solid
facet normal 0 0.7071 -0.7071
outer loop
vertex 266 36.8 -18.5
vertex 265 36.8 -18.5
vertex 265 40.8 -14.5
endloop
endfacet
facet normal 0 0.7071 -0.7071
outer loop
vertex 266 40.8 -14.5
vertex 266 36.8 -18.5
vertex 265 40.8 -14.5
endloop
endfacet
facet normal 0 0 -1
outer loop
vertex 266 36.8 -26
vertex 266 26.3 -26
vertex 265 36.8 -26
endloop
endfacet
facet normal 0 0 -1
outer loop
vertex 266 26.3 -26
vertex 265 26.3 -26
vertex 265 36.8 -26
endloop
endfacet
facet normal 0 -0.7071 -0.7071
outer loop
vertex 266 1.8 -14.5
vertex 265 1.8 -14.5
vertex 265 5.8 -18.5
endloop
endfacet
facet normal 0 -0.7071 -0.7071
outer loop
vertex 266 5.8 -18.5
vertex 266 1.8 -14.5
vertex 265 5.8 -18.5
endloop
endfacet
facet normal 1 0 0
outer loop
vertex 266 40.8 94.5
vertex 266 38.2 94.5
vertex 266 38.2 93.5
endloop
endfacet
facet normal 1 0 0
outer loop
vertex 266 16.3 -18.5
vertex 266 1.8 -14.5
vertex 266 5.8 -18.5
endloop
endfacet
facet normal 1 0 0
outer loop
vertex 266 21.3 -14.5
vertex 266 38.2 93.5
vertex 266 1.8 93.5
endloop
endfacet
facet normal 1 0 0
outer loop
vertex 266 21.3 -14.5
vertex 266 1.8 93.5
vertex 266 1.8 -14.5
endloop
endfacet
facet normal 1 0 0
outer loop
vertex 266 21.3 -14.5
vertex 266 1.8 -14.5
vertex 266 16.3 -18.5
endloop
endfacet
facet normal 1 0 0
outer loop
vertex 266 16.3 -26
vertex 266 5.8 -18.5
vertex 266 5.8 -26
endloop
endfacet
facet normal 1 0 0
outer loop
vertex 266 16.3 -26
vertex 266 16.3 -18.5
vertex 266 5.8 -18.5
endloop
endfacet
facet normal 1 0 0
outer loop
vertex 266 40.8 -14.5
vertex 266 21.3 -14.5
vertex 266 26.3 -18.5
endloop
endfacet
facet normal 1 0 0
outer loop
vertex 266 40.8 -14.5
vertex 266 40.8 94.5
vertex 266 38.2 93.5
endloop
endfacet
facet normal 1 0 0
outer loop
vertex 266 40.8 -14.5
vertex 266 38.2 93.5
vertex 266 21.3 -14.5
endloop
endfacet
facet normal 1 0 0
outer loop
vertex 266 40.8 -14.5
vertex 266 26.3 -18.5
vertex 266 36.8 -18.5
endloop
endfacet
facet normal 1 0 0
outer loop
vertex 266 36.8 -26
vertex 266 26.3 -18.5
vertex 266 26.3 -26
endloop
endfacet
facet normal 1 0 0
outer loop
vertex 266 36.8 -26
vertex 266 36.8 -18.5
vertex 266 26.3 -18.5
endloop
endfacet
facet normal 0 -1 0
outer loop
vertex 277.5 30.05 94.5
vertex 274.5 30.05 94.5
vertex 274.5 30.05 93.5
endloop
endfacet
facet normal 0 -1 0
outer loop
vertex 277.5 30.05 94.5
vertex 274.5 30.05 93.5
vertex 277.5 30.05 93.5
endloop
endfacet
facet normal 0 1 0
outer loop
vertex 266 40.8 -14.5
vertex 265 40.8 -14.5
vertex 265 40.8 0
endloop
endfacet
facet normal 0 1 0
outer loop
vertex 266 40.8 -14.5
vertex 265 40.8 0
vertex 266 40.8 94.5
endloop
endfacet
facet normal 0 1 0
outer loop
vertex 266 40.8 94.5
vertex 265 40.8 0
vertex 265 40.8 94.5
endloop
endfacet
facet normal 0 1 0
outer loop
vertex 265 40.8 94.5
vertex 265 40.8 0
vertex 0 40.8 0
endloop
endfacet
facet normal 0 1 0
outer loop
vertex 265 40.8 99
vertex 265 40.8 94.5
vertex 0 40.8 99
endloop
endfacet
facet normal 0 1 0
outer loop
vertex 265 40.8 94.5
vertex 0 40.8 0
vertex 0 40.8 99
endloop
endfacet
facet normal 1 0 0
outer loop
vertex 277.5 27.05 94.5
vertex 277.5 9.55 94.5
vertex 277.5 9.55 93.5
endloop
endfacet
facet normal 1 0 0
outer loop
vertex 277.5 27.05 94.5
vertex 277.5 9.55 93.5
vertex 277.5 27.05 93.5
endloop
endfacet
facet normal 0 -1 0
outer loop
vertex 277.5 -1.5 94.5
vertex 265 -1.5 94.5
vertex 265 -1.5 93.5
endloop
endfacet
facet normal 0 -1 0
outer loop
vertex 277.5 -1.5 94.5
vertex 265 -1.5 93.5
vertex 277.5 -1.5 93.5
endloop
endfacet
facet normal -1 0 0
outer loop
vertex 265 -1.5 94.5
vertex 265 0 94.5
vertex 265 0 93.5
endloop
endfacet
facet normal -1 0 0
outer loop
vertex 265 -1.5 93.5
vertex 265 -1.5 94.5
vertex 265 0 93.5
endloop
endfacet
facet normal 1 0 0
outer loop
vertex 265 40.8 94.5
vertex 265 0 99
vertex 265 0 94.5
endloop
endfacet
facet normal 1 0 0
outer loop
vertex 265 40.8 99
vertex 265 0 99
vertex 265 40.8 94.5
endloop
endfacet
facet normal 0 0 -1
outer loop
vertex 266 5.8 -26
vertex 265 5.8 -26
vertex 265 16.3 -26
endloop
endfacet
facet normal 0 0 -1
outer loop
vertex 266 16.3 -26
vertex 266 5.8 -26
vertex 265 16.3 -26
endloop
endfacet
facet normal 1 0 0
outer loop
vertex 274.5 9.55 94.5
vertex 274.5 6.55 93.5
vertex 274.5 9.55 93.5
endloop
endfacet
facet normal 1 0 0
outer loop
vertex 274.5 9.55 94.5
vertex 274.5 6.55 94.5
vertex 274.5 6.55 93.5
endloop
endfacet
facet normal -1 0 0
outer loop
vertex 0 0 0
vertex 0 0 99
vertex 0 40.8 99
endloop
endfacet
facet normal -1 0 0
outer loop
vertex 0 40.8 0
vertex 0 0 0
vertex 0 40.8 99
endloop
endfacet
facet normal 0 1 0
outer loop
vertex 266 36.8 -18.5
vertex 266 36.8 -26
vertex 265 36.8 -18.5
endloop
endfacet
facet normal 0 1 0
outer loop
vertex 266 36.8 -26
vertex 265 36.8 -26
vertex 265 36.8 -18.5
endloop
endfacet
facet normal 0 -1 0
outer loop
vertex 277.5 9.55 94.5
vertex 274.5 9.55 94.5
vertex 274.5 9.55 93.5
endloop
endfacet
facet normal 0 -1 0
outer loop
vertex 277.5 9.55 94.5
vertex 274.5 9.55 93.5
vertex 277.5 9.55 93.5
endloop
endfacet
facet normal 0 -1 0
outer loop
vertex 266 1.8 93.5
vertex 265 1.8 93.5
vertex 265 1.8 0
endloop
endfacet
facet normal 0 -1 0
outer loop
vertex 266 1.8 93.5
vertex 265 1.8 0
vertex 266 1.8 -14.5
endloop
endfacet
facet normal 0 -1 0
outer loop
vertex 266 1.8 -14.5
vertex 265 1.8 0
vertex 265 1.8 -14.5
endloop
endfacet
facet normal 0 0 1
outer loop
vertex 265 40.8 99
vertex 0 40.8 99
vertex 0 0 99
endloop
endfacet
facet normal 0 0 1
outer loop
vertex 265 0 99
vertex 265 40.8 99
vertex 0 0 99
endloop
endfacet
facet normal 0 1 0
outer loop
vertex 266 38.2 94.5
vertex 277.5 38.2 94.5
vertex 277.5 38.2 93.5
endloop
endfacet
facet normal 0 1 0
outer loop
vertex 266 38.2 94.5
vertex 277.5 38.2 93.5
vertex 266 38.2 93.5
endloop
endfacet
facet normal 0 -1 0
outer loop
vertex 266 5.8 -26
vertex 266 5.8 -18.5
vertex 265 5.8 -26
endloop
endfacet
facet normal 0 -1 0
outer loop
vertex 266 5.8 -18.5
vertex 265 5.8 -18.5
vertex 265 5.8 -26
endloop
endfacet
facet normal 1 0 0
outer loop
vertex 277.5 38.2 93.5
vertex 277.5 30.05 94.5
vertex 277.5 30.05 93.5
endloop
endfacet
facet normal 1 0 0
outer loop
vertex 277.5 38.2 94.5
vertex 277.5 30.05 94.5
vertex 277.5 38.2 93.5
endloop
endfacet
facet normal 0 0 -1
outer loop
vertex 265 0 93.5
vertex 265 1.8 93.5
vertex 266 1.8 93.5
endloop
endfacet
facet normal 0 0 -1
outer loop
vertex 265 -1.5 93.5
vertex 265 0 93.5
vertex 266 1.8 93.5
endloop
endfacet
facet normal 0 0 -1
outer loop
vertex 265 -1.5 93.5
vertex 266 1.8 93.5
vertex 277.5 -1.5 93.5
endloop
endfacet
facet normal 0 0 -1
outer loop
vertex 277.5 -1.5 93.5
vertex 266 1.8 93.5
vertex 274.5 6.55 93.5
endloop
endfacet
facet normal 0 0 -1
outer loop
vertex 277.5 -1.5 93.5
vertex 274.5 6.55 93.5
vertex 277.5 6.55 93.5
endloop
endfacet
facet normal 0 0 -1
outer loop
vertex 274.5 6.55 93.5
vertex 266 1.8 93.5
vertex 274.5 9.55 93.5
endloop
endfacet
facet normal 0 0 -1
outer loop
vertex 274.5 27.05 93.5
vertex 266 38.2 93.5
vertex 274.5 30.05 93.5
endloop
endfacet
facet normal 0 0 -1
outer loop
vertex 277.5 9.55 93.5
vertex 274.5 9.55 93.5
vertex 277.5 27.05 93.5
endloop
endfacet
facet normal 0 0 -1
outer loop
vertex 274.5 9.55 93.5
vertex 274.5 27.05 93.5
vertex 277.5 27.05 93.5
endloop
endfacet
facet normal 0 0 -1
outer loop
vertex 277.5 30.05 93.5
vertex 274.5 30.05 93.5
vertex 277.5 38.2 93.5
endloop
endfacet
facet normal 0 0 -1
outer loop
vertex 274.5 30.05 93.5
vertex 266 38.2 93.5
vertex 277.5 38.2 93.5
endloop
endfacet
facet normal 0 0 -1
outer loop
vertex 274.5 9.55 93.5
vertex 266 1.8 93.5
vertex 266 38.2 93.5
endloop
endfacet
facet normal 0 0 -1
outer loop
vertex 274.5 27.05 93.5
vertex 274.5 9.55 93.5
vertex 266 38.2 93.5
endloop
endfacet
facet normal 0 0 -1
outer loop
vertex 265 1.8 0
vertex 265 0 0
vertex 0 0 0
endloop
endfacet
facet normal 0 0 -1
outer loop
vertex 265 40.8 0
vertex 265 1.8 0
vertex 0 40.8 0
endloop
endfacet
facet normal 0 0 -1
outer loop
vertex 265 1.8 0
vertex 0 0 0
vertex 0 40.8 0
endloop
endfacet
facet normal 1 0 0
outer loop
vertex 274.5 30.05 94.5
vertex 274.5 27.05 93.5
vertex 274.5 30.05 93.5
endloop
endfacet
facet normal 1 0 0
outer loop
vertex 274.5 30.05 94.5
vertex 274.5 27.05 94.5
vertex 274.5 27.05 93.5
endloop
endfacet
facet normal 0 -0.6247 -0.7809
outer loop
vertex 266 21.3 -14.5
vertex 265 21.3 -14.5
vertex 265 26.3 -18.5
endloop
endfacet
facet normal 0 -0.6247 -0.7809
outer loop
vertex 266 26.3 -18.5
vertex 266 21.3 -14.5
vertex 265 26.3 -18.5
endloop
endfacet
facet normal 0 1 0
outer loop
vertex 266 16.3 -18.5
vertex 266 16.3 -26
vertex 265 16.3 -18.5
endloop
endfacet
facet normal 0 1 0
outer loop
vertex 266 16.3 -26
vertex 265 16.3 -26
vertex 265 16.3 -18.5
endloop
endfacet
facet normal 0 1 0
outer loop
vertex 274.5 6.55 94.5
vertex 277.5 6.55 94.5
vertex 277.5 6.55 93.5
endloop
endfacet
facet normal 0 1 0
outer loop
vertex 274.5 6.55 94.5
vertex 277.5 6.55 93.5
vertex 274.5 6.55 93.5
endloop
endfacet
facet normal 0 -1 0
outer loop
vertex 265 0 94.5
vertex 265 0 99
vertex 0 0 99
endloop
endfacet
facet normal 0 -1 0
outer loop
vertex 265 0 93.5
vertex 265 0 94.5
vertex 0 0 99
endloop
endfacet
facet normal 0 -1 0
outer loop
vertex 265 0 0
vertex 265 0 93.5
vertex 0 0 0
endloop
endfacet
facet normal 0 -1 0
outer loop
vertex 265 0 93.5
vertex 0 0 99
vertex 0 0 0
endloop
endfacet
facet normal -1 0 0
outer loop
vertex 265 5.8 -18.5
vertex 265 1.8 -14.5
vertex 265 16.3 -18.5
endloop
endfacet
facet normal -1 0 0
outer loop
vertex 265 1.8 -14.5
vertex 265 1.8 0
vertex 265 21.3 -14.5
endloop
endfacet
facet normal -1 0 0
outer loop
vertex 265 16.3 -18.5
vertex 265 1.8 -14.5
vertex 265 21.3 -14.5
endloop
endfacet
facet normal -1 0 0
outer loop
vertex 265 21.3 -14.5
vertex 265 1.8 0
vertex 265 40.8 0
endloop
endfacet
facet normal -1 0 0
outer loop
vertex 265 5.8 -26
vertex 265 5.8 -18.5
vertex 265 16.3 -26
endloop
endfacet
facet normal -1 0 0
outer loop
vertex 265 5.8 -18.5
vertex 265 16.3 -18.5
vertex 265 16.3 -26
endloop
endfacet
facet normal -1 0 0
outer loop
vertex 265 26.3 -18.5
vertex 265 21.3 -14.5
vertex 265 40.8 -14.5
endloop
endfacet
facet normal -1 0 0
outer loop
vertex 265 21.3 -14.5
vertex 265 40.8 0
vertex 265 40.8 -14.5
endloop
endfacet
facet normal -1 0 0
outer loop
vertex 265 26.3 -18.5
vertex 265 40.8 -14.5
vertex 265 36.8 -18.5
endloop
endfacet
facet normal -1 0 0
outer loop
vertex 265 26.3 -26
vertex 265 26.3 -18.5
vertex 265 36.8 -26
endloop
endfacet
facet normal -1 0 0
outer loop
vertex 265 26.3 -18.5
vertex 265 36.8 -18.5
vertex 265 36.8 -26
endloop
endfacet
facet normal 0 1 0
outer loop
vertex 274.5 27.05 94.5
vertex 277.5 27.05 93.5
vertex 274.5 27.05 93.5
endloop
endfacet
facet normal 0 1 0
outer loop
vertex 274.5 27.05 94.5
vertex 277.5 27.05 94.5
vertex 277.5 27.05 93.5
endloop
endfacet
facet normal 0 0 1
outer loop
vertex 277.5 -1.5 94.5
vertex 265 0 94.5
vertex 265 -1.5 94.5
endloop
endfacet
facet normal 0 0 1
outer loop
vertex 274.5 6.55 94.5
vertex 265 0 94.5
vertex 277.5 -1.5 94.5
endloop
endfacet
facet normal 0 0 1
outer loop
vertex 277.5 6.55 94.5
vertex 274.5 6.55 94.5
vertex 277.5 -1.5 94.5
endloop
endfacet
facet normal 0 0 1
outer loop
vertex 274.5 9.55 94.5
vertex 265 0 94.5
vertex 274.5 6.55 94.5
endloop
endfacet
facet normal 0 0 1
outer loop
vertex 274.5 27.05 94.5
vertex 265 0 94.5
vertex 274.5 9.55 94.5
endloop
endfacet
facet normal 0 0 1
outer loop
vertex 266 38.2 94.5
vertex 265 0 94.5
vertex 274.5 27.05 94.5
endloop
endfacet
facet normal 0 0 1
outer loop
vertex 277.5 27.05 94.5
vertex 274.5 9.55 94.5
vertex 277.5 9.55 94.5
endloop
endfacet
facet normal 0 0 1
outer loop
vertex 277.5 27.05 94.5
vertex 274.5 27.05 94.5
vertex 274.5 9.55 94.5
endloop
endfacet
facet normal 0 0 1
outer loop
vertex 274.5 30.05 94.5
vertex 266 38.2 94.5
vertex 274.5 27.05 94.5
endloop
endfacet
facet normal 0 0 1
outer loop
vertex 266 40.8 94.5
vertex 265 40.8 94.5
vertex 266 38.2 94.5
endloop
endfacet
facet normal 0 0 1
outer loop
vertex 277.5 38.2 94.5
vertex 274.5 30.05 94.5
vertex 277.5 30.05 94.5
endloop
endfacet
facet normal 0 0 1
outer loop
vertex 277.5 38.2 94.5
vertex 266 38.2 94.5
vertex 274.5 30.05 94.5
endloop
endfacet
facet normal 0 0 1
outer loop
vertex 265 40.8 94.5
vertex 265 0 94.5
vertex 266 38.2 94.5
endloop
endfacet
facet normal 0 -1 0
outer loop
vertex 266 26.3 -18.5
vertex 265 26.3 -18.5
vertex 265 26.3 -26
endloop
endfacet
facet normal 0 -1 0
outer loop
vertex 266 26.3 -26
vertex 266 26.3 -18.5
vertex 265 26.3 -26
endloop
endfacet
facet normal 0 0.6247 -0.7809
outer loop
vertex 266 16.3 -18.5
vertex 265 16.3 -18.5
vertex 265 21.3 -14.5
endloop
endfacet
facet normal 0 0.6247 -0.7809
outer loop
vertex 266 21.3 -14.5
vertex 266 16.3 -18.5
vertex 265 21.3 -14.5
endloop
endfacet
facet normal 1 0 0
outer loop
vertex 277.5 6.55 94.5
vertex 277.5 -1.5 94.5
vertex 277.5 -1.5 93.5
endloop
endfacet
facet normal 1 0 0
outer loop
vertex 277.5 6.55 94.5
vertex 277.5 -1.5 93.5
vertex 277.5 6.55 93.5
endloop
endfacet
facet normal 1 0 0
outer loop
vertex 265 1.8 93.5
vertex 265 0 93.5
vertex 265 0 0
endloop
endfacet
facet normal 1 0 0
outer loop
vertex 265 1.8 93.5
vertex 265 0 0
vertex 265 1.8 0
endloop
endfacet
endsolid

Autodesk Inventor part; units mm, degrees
ref_plane "YZ Plane" through (0, 0, 0) normal (1, 0, 0) x (0, 1, 0)
ref_plane "XZ Plane" through (0, 0, 0) normal (0, 1, 0) x (-1, 0, 0)
ref_plane "XY Plane" through (0, 0, 0) normal (0, 0, 1) x (1, 0, 0)
sketch "Sketch1" plane through (0, 0, 0) normal (1, 0, 0) x (0, 1, 0)
  line L0 (0, 0) -> (40.8, 0)
  line L1 (40.8, 0) -> (40.8, 99)
  line L2 (40.8, 99) -> (0, 99)
  line L3 (0, 99) -> (0, 0)
  dimension "d0" = 40.8
  dimension "d1" = 99
extrude "Extrusion1" add sketch "Sketch1" along normal blind 265
sketch "Sketch2" plane through (265, 0, 0) normal (1, 0, 0) x (0, 0, -1)
  line L0 (0, 40.8) -> (-99, 40.8) projected
  line L1 (-94.5, 40.8) -> (-94.5, -1.5)
  line L2 (-94.5, -1.5) -> (-93.5, -1.5)
  line L3 (-93.5, -1.5) -> (-93.5, 1.8)
  line L4 (-93.5, 1.8) -> (14.5, 1.8)
  line L5 (14.5, 1.8) -> (18.5, 5.8)
  line L6 (18.5, 5.8) -> (26, 5.8)
  line L7 (26, 5.8) -> (26, 16.3)
  line L8 (26, 16.3) -> (18.5, 16.3)
  line L9 (18.5, 16.3) -> (14.5, 21.3)
  line L10 (14.5, 21.3) -> (18.5, 26.3)
  line L11 (18.5, 26.3) -> (26, 26.3)
  line L12 (26, 26.3) -> (26, 36.8)
  line L13 (26, 36.8) -> (18.5, 36.8)
  line L14 (18.5, 36.8) -> (14.5, 40.8)
  line L15 (14.5, 40.8) -> (0, 40.8)
  line L16 (0, 0) -> (0, 40.8) projected
  line L17 (0, 40.8) -> (-94.5, 40.8)
  line L18 (-99, 40.8) -> (-99, 0) projected
  line L19 (-99, 0) -> (0, 0) projected
  line L20 (14.5, 21.3) -> (14.5, 40.8) construction
  dimension "d4" = 4.5
  dimension "d5" = 1
  dimension "d6" = 1.5
  dimension "d7" = 135
  dimension "d8" = 135
  dimension "d9" = 10.5
  dimension "d10" = 4
  dimension "d11" = 7.5
  dimension "d13" = 10
  dimension "d14" = 108
extrude "Extrusion2" add sketch "Sketch2" along normal blind 1 contours L16 L4 L3 L19 L1 L0 | L15 L14 L13 L12 L11 L10 L9 L8 L7 L6 L5 L4 L16 | L19 L3 L2 L1
sketch "Sketch3" plane through (265, -1.5, 94.5) normal (0, 0, 1) x (1, 0, 0)
  line L0 (1, 42.3) -> (1, 0) projected
  line L1 (1, 0) -> (12.5, 0)
  line L2 (12.5, 0) -> (12.5, 8.05)
  line L3 (12.5, 8.05) -> (9.5, 8.05)
  line L4 (9.5, 8.05) -> (9.5, 11.05)
  line L5 (9.5, 11.05) -> (12.5, 11.05)
  line L6 (12.5, 11.05) -> (12.5, 28.55)
  line L7 (12.5, 28.55) -> (9.5, 28.55)
  line L8 (9.5, 28.55) -> (9.5, 31.55)
  line L9 (9.5, 31.55) -> (12.5, 31.55)
  line L10 (12.5, 31.55) -> (12.5, 39.7)
  line L11 (12.5, 39.7) -> (1, 39.7)
  line L12 (1, 39.7) -> (1, 0)
  line L13 (0, 42.3) -> (0, 1.5) projected
  line L14 (0, 42.3) -> (1, 42.3) projected
  point P0 (-265, 1.5)
  point P1 (9.5, 30.05)
  point P2 (9.5, 9.55)
  dimension "d17" = 11.5
  dimension "d18" = 12.25
  dimension "d19" = 20.5
  dimension "d20" = 3
  dimension "d21" = 3
  dimension "d22" = 3
  dimension "d23" = 2.6
extrude "Extrusion3" add sketch "Sketch3" against normal blind 1
properties part number "Vega56dummy"
